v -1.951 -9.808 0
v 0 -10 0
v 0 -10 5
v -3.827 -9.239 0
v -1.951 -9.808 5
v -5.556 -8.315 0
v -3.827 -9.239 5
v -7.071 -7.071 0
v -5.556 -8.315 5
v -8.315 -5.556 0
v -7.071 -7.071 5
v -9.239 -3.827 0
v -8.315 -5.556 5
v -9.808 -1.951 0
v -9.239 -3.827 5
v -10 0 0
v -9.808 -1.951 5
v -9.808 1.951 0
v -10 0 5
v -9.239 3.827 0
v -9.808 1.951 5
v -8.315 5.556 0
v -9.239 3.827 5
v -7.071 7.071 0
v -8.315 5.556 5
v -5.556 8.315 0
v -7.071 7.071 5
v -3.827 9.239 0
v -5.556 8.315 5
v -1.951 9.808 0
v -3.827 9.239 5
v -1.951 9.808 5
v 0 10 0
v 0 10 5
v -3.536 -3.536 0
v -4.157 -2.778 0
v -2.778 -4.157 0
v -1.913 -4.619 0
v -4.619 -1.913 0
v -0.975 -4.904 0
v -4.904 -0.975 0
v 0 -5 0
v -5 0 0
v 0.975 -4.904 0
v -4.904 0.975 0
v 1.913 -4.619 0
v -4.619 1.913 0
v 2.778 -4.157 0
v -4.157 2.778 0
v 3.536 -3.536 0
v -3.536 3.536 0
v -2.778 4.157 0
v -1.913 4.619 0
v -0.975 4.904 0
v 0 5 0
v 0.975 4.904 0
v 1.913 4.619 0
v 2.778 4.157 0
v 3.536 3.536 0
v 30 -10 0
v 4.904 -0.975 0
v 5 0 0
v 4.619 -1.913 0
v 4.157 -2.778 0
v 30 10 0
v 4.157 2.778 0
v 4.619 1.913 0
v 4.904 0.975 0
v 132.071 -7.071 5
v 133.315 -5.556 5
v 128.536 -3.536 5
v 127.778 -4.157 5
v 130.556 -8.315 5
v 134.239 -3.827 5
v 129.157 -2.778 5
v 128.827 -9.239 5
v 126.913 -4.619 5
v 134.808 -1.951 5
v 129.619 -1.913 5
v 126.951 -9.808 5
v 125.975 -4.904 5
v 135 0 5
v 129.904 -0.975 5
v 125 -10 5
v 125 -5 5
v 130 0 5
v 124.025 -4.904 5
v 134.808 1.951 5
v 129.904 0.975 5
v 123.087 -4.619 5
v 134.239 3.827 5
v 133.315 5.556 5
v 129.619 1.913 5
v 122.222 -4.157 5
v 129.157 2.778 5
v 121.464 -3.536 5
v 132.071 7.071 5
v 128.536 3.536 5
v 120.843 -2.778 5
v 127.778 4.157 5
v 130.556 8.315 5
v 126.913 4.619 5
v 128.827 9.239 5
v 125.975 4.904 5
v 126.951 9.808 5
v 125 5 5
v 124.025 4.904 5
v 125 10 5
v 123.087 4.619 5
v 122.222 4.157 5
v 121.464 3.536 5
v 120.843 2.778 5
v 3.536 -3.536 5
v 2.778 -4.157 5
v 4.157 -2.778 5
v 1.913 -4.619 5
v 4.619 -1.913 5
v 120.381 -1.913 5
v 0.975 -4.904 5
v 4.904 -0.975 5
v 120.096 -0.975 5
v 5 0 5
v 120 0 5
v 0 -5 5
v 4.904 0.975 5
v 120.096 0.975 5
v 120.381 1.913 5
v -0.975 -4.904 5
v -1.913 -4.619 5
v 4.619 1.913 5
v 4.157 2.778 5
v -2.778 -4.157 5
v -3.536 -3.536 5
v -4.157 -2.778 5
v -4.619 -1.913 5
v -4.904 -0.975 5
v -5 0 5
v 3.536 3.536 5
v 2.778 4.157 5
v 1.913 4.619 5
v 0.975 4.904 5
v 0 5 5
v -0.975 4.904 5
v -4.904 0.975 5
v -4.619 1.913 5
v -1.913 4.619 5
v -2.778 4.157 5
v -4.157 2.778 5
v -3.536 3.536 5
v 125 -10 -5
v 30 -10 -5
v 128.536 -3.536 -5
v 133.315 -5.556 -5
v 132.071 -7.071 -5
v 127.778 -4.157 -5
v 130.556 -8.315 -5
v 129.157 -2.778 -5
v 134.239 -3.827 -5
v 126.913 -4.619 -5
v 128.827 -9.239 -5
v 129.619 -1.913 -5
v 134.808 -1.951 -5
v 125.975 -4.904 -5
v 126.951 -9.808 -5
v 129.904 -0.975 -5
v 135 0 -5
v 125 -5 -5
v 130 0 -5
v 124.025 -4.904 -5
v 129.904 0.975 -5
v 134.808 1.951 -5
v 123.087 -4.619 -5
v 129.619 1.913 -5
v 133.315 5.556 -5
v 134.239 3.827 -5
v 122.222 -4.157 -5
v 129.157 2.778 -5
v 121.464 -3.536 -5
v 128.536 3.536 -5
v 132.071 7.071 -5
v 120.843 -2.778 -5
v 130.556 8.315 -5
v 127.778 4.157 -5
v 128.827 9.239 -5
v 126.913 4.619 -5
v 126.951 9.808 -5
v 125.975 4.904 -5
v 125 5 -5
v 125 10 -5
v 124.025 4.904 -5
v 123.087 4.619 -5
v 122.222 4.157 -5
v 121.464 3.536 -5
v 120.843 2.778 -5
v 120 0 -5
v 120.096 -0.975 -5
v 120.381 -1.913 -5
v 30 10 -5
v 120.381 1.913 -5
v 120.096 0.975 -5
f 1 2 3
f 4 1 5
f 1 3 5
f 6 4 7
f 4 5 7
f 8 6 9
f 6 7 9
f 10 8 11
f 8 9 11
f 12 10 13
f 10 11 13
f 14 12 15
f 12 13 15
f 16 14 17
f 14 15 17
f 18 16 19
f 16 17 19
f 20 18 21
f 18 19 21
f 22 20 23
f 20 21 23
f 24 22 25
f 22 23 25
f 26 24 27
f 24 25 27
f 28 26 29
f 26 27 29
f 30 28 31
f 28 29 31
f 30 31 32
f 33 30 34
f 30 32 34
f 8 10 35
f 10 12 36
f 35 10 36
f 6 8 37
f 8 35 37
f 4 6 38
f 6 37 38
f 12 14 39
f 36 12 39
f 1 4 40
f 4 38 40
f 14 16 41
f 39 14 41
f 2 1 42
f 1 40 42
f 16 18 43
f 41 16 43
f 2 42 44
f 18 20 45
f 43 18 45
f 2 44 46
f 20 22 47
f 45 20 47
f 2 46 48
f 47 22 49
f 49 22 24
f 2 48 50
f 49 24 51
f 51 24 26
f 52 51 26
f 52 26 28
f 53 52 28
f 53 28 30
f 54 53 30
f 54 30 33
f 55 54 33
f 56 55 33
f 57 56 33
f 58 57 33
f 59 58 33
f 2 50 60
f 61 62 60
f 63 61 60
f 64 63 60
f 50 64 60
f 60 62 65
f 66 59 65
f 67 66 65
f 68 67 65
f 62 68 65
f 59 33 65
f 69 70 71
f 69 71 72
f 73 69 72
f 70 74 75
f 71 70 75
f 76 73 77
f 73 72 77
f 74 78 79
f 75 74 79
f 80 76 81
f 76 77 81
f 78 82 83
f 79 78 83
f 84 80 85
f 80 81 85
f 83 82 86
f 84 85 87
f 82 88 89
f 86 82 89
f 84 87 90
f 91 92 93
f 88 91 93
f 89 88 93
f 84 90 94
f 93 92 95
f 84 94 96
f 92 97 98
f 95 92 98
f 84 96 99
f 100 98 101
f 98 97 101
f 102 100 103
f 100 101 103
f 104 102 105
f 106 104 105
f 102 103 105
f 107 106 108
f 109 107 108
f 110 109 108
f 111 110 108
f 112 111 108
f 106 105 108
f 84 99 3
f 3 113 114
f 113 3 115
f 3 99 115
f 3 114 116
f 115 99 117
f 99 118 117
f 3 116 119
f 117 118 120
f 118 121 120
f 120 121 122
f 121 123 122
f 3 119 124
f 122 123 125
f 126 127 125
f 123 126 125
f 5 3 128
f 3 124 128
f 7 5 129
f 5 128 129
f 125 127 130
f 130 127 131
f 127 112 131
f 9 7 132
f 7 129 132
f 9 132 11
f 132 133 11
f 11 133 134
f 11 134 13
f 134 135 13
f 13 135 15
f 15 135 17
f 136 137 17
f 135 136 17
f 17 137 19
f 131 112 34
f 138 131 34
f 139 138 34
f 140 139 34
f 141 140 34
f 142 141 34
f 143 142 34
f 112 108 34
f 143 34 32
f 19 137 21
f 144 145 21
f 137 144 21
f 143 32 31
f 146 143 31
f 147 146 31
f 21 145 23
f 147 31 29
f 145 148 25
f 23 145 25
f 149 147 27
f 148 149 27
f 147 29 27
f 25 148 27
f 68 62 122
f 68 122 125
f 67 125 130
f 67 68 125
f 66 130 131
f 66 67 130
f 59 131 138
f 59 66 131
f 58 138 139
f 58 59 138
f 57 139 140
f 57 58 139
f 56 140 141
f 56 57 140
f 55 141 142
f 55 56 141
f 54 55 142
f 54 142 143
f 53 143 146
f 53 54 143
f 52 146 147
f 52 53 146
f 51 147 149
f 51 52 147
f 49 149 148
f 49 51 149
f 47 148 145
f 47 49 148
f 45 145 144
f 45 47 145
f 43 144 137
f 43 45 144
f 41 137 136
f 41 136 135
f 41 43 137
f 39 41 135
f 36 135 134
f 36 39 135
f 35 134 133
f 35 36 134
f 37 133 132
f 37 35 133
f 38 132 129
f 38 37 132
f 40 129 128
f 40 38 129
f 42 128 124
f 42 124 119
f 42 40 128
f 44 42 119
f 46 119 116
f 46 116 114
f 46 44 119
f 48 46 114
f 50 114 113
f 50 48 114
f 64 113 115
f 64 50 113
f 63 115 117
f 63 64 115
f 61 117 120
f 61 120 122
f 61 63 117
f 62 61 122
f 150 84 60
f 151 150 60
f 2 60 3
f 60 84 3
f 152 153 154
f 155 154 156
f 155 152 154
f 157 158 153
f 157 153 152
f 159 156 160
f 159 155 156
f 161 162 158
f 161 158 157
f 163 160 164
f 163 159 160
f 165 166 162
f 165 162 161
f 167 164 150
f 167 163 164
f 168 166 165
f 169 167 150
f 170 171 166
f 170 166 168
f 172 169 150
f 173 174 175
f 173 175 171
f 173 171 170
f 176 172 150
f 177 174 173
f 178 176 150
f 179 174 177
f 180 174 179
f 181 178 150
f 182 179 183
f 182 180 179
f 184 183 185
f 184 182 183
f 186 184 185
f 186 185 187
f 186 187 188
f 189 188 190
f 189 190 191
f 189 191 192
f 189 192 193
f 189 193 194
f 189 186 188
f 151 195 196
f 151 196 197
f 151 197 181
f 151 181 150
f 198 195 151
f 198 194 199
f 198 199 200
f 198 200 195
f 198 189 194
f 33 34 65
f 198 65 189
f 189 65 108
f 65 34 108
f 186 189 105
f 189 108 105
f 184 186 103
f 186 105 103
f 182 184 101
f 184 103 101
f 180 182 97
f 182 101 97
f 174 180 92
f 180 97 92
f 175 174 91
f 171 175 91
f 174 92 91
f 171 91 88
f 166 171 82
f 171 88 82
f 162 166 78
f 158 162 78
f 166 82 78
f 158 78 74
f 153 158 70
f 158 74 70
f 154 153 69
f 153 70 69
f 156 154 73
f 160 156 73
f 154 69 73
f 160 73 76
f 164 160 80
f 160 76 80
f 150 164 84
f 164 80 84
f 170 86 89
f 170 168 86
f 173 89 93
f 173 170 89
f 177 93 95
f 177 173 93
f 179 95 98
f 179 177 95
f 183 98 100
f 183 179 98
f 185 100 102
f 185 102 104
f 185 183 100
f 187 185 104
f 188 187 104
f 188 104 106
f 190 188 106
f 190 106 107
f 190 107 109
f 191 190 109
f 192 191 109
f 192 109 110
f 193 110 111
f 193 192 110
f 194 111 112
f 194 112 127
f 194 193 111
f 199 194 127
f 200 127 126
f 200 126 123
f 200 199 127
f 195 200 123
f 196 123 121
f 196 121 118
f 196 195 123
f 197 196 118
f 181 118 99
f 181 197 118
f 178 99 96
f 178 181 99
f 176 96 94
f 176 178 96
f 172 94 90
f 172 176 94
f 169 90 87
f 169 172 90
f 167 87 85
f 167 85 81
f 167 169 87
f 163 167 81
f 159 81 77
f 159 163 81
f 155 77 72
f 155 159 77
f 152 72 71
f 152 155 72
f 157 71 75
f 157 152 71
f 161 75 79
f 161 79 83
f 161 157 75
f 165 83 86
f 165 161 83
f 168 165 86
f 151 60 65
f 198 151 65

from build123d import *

# Parameters (mm, degrees)
SKETCH1_R           = 5
BOSS_EXTRUDE1_DEPTH = 5
SKETCH2_W           = 59.402785504
SKETCH2_H           = 20
CUT_EXTRUDE1_DEPTH  = 136.462171841


with BuildPart() as part:
    # Sketch1 → Boss-Extrude1 (new, symmetric)
    with BuildSketch(Plane.XY):
        with BuildLine():
            Line((0, 10), (125, 10))
            ThreePointArc((125, 10), (135, 0), (125, -10))
            Line((125, -10), (0, -10))
            ThreePointArc((0, -10), (-10, 0), (0, 10))
        make_face()
        Circle(SKETCH1_R, mode=Mode.SUBTRACT)
        with Locations((125, 0)):
            Circle(SKETCH1_R, mode=Mode.SUBTRACT)
    extrude(amount=BOSS_EXTRUDE1_DEPTH, both=True)

    # Sketch2 → Cut-Extrude1 (cut, through all)
    with BuildSketch(Plane.XY):
        with Locations((0.298607248, 0)):
            Rectangle(SKETCH2_W, SKETCH2_H)
    extrude(amount=-CUT_EXTRUDE1_DEPTH, mode=Mode.SUBTRACT)


solid = part.part
